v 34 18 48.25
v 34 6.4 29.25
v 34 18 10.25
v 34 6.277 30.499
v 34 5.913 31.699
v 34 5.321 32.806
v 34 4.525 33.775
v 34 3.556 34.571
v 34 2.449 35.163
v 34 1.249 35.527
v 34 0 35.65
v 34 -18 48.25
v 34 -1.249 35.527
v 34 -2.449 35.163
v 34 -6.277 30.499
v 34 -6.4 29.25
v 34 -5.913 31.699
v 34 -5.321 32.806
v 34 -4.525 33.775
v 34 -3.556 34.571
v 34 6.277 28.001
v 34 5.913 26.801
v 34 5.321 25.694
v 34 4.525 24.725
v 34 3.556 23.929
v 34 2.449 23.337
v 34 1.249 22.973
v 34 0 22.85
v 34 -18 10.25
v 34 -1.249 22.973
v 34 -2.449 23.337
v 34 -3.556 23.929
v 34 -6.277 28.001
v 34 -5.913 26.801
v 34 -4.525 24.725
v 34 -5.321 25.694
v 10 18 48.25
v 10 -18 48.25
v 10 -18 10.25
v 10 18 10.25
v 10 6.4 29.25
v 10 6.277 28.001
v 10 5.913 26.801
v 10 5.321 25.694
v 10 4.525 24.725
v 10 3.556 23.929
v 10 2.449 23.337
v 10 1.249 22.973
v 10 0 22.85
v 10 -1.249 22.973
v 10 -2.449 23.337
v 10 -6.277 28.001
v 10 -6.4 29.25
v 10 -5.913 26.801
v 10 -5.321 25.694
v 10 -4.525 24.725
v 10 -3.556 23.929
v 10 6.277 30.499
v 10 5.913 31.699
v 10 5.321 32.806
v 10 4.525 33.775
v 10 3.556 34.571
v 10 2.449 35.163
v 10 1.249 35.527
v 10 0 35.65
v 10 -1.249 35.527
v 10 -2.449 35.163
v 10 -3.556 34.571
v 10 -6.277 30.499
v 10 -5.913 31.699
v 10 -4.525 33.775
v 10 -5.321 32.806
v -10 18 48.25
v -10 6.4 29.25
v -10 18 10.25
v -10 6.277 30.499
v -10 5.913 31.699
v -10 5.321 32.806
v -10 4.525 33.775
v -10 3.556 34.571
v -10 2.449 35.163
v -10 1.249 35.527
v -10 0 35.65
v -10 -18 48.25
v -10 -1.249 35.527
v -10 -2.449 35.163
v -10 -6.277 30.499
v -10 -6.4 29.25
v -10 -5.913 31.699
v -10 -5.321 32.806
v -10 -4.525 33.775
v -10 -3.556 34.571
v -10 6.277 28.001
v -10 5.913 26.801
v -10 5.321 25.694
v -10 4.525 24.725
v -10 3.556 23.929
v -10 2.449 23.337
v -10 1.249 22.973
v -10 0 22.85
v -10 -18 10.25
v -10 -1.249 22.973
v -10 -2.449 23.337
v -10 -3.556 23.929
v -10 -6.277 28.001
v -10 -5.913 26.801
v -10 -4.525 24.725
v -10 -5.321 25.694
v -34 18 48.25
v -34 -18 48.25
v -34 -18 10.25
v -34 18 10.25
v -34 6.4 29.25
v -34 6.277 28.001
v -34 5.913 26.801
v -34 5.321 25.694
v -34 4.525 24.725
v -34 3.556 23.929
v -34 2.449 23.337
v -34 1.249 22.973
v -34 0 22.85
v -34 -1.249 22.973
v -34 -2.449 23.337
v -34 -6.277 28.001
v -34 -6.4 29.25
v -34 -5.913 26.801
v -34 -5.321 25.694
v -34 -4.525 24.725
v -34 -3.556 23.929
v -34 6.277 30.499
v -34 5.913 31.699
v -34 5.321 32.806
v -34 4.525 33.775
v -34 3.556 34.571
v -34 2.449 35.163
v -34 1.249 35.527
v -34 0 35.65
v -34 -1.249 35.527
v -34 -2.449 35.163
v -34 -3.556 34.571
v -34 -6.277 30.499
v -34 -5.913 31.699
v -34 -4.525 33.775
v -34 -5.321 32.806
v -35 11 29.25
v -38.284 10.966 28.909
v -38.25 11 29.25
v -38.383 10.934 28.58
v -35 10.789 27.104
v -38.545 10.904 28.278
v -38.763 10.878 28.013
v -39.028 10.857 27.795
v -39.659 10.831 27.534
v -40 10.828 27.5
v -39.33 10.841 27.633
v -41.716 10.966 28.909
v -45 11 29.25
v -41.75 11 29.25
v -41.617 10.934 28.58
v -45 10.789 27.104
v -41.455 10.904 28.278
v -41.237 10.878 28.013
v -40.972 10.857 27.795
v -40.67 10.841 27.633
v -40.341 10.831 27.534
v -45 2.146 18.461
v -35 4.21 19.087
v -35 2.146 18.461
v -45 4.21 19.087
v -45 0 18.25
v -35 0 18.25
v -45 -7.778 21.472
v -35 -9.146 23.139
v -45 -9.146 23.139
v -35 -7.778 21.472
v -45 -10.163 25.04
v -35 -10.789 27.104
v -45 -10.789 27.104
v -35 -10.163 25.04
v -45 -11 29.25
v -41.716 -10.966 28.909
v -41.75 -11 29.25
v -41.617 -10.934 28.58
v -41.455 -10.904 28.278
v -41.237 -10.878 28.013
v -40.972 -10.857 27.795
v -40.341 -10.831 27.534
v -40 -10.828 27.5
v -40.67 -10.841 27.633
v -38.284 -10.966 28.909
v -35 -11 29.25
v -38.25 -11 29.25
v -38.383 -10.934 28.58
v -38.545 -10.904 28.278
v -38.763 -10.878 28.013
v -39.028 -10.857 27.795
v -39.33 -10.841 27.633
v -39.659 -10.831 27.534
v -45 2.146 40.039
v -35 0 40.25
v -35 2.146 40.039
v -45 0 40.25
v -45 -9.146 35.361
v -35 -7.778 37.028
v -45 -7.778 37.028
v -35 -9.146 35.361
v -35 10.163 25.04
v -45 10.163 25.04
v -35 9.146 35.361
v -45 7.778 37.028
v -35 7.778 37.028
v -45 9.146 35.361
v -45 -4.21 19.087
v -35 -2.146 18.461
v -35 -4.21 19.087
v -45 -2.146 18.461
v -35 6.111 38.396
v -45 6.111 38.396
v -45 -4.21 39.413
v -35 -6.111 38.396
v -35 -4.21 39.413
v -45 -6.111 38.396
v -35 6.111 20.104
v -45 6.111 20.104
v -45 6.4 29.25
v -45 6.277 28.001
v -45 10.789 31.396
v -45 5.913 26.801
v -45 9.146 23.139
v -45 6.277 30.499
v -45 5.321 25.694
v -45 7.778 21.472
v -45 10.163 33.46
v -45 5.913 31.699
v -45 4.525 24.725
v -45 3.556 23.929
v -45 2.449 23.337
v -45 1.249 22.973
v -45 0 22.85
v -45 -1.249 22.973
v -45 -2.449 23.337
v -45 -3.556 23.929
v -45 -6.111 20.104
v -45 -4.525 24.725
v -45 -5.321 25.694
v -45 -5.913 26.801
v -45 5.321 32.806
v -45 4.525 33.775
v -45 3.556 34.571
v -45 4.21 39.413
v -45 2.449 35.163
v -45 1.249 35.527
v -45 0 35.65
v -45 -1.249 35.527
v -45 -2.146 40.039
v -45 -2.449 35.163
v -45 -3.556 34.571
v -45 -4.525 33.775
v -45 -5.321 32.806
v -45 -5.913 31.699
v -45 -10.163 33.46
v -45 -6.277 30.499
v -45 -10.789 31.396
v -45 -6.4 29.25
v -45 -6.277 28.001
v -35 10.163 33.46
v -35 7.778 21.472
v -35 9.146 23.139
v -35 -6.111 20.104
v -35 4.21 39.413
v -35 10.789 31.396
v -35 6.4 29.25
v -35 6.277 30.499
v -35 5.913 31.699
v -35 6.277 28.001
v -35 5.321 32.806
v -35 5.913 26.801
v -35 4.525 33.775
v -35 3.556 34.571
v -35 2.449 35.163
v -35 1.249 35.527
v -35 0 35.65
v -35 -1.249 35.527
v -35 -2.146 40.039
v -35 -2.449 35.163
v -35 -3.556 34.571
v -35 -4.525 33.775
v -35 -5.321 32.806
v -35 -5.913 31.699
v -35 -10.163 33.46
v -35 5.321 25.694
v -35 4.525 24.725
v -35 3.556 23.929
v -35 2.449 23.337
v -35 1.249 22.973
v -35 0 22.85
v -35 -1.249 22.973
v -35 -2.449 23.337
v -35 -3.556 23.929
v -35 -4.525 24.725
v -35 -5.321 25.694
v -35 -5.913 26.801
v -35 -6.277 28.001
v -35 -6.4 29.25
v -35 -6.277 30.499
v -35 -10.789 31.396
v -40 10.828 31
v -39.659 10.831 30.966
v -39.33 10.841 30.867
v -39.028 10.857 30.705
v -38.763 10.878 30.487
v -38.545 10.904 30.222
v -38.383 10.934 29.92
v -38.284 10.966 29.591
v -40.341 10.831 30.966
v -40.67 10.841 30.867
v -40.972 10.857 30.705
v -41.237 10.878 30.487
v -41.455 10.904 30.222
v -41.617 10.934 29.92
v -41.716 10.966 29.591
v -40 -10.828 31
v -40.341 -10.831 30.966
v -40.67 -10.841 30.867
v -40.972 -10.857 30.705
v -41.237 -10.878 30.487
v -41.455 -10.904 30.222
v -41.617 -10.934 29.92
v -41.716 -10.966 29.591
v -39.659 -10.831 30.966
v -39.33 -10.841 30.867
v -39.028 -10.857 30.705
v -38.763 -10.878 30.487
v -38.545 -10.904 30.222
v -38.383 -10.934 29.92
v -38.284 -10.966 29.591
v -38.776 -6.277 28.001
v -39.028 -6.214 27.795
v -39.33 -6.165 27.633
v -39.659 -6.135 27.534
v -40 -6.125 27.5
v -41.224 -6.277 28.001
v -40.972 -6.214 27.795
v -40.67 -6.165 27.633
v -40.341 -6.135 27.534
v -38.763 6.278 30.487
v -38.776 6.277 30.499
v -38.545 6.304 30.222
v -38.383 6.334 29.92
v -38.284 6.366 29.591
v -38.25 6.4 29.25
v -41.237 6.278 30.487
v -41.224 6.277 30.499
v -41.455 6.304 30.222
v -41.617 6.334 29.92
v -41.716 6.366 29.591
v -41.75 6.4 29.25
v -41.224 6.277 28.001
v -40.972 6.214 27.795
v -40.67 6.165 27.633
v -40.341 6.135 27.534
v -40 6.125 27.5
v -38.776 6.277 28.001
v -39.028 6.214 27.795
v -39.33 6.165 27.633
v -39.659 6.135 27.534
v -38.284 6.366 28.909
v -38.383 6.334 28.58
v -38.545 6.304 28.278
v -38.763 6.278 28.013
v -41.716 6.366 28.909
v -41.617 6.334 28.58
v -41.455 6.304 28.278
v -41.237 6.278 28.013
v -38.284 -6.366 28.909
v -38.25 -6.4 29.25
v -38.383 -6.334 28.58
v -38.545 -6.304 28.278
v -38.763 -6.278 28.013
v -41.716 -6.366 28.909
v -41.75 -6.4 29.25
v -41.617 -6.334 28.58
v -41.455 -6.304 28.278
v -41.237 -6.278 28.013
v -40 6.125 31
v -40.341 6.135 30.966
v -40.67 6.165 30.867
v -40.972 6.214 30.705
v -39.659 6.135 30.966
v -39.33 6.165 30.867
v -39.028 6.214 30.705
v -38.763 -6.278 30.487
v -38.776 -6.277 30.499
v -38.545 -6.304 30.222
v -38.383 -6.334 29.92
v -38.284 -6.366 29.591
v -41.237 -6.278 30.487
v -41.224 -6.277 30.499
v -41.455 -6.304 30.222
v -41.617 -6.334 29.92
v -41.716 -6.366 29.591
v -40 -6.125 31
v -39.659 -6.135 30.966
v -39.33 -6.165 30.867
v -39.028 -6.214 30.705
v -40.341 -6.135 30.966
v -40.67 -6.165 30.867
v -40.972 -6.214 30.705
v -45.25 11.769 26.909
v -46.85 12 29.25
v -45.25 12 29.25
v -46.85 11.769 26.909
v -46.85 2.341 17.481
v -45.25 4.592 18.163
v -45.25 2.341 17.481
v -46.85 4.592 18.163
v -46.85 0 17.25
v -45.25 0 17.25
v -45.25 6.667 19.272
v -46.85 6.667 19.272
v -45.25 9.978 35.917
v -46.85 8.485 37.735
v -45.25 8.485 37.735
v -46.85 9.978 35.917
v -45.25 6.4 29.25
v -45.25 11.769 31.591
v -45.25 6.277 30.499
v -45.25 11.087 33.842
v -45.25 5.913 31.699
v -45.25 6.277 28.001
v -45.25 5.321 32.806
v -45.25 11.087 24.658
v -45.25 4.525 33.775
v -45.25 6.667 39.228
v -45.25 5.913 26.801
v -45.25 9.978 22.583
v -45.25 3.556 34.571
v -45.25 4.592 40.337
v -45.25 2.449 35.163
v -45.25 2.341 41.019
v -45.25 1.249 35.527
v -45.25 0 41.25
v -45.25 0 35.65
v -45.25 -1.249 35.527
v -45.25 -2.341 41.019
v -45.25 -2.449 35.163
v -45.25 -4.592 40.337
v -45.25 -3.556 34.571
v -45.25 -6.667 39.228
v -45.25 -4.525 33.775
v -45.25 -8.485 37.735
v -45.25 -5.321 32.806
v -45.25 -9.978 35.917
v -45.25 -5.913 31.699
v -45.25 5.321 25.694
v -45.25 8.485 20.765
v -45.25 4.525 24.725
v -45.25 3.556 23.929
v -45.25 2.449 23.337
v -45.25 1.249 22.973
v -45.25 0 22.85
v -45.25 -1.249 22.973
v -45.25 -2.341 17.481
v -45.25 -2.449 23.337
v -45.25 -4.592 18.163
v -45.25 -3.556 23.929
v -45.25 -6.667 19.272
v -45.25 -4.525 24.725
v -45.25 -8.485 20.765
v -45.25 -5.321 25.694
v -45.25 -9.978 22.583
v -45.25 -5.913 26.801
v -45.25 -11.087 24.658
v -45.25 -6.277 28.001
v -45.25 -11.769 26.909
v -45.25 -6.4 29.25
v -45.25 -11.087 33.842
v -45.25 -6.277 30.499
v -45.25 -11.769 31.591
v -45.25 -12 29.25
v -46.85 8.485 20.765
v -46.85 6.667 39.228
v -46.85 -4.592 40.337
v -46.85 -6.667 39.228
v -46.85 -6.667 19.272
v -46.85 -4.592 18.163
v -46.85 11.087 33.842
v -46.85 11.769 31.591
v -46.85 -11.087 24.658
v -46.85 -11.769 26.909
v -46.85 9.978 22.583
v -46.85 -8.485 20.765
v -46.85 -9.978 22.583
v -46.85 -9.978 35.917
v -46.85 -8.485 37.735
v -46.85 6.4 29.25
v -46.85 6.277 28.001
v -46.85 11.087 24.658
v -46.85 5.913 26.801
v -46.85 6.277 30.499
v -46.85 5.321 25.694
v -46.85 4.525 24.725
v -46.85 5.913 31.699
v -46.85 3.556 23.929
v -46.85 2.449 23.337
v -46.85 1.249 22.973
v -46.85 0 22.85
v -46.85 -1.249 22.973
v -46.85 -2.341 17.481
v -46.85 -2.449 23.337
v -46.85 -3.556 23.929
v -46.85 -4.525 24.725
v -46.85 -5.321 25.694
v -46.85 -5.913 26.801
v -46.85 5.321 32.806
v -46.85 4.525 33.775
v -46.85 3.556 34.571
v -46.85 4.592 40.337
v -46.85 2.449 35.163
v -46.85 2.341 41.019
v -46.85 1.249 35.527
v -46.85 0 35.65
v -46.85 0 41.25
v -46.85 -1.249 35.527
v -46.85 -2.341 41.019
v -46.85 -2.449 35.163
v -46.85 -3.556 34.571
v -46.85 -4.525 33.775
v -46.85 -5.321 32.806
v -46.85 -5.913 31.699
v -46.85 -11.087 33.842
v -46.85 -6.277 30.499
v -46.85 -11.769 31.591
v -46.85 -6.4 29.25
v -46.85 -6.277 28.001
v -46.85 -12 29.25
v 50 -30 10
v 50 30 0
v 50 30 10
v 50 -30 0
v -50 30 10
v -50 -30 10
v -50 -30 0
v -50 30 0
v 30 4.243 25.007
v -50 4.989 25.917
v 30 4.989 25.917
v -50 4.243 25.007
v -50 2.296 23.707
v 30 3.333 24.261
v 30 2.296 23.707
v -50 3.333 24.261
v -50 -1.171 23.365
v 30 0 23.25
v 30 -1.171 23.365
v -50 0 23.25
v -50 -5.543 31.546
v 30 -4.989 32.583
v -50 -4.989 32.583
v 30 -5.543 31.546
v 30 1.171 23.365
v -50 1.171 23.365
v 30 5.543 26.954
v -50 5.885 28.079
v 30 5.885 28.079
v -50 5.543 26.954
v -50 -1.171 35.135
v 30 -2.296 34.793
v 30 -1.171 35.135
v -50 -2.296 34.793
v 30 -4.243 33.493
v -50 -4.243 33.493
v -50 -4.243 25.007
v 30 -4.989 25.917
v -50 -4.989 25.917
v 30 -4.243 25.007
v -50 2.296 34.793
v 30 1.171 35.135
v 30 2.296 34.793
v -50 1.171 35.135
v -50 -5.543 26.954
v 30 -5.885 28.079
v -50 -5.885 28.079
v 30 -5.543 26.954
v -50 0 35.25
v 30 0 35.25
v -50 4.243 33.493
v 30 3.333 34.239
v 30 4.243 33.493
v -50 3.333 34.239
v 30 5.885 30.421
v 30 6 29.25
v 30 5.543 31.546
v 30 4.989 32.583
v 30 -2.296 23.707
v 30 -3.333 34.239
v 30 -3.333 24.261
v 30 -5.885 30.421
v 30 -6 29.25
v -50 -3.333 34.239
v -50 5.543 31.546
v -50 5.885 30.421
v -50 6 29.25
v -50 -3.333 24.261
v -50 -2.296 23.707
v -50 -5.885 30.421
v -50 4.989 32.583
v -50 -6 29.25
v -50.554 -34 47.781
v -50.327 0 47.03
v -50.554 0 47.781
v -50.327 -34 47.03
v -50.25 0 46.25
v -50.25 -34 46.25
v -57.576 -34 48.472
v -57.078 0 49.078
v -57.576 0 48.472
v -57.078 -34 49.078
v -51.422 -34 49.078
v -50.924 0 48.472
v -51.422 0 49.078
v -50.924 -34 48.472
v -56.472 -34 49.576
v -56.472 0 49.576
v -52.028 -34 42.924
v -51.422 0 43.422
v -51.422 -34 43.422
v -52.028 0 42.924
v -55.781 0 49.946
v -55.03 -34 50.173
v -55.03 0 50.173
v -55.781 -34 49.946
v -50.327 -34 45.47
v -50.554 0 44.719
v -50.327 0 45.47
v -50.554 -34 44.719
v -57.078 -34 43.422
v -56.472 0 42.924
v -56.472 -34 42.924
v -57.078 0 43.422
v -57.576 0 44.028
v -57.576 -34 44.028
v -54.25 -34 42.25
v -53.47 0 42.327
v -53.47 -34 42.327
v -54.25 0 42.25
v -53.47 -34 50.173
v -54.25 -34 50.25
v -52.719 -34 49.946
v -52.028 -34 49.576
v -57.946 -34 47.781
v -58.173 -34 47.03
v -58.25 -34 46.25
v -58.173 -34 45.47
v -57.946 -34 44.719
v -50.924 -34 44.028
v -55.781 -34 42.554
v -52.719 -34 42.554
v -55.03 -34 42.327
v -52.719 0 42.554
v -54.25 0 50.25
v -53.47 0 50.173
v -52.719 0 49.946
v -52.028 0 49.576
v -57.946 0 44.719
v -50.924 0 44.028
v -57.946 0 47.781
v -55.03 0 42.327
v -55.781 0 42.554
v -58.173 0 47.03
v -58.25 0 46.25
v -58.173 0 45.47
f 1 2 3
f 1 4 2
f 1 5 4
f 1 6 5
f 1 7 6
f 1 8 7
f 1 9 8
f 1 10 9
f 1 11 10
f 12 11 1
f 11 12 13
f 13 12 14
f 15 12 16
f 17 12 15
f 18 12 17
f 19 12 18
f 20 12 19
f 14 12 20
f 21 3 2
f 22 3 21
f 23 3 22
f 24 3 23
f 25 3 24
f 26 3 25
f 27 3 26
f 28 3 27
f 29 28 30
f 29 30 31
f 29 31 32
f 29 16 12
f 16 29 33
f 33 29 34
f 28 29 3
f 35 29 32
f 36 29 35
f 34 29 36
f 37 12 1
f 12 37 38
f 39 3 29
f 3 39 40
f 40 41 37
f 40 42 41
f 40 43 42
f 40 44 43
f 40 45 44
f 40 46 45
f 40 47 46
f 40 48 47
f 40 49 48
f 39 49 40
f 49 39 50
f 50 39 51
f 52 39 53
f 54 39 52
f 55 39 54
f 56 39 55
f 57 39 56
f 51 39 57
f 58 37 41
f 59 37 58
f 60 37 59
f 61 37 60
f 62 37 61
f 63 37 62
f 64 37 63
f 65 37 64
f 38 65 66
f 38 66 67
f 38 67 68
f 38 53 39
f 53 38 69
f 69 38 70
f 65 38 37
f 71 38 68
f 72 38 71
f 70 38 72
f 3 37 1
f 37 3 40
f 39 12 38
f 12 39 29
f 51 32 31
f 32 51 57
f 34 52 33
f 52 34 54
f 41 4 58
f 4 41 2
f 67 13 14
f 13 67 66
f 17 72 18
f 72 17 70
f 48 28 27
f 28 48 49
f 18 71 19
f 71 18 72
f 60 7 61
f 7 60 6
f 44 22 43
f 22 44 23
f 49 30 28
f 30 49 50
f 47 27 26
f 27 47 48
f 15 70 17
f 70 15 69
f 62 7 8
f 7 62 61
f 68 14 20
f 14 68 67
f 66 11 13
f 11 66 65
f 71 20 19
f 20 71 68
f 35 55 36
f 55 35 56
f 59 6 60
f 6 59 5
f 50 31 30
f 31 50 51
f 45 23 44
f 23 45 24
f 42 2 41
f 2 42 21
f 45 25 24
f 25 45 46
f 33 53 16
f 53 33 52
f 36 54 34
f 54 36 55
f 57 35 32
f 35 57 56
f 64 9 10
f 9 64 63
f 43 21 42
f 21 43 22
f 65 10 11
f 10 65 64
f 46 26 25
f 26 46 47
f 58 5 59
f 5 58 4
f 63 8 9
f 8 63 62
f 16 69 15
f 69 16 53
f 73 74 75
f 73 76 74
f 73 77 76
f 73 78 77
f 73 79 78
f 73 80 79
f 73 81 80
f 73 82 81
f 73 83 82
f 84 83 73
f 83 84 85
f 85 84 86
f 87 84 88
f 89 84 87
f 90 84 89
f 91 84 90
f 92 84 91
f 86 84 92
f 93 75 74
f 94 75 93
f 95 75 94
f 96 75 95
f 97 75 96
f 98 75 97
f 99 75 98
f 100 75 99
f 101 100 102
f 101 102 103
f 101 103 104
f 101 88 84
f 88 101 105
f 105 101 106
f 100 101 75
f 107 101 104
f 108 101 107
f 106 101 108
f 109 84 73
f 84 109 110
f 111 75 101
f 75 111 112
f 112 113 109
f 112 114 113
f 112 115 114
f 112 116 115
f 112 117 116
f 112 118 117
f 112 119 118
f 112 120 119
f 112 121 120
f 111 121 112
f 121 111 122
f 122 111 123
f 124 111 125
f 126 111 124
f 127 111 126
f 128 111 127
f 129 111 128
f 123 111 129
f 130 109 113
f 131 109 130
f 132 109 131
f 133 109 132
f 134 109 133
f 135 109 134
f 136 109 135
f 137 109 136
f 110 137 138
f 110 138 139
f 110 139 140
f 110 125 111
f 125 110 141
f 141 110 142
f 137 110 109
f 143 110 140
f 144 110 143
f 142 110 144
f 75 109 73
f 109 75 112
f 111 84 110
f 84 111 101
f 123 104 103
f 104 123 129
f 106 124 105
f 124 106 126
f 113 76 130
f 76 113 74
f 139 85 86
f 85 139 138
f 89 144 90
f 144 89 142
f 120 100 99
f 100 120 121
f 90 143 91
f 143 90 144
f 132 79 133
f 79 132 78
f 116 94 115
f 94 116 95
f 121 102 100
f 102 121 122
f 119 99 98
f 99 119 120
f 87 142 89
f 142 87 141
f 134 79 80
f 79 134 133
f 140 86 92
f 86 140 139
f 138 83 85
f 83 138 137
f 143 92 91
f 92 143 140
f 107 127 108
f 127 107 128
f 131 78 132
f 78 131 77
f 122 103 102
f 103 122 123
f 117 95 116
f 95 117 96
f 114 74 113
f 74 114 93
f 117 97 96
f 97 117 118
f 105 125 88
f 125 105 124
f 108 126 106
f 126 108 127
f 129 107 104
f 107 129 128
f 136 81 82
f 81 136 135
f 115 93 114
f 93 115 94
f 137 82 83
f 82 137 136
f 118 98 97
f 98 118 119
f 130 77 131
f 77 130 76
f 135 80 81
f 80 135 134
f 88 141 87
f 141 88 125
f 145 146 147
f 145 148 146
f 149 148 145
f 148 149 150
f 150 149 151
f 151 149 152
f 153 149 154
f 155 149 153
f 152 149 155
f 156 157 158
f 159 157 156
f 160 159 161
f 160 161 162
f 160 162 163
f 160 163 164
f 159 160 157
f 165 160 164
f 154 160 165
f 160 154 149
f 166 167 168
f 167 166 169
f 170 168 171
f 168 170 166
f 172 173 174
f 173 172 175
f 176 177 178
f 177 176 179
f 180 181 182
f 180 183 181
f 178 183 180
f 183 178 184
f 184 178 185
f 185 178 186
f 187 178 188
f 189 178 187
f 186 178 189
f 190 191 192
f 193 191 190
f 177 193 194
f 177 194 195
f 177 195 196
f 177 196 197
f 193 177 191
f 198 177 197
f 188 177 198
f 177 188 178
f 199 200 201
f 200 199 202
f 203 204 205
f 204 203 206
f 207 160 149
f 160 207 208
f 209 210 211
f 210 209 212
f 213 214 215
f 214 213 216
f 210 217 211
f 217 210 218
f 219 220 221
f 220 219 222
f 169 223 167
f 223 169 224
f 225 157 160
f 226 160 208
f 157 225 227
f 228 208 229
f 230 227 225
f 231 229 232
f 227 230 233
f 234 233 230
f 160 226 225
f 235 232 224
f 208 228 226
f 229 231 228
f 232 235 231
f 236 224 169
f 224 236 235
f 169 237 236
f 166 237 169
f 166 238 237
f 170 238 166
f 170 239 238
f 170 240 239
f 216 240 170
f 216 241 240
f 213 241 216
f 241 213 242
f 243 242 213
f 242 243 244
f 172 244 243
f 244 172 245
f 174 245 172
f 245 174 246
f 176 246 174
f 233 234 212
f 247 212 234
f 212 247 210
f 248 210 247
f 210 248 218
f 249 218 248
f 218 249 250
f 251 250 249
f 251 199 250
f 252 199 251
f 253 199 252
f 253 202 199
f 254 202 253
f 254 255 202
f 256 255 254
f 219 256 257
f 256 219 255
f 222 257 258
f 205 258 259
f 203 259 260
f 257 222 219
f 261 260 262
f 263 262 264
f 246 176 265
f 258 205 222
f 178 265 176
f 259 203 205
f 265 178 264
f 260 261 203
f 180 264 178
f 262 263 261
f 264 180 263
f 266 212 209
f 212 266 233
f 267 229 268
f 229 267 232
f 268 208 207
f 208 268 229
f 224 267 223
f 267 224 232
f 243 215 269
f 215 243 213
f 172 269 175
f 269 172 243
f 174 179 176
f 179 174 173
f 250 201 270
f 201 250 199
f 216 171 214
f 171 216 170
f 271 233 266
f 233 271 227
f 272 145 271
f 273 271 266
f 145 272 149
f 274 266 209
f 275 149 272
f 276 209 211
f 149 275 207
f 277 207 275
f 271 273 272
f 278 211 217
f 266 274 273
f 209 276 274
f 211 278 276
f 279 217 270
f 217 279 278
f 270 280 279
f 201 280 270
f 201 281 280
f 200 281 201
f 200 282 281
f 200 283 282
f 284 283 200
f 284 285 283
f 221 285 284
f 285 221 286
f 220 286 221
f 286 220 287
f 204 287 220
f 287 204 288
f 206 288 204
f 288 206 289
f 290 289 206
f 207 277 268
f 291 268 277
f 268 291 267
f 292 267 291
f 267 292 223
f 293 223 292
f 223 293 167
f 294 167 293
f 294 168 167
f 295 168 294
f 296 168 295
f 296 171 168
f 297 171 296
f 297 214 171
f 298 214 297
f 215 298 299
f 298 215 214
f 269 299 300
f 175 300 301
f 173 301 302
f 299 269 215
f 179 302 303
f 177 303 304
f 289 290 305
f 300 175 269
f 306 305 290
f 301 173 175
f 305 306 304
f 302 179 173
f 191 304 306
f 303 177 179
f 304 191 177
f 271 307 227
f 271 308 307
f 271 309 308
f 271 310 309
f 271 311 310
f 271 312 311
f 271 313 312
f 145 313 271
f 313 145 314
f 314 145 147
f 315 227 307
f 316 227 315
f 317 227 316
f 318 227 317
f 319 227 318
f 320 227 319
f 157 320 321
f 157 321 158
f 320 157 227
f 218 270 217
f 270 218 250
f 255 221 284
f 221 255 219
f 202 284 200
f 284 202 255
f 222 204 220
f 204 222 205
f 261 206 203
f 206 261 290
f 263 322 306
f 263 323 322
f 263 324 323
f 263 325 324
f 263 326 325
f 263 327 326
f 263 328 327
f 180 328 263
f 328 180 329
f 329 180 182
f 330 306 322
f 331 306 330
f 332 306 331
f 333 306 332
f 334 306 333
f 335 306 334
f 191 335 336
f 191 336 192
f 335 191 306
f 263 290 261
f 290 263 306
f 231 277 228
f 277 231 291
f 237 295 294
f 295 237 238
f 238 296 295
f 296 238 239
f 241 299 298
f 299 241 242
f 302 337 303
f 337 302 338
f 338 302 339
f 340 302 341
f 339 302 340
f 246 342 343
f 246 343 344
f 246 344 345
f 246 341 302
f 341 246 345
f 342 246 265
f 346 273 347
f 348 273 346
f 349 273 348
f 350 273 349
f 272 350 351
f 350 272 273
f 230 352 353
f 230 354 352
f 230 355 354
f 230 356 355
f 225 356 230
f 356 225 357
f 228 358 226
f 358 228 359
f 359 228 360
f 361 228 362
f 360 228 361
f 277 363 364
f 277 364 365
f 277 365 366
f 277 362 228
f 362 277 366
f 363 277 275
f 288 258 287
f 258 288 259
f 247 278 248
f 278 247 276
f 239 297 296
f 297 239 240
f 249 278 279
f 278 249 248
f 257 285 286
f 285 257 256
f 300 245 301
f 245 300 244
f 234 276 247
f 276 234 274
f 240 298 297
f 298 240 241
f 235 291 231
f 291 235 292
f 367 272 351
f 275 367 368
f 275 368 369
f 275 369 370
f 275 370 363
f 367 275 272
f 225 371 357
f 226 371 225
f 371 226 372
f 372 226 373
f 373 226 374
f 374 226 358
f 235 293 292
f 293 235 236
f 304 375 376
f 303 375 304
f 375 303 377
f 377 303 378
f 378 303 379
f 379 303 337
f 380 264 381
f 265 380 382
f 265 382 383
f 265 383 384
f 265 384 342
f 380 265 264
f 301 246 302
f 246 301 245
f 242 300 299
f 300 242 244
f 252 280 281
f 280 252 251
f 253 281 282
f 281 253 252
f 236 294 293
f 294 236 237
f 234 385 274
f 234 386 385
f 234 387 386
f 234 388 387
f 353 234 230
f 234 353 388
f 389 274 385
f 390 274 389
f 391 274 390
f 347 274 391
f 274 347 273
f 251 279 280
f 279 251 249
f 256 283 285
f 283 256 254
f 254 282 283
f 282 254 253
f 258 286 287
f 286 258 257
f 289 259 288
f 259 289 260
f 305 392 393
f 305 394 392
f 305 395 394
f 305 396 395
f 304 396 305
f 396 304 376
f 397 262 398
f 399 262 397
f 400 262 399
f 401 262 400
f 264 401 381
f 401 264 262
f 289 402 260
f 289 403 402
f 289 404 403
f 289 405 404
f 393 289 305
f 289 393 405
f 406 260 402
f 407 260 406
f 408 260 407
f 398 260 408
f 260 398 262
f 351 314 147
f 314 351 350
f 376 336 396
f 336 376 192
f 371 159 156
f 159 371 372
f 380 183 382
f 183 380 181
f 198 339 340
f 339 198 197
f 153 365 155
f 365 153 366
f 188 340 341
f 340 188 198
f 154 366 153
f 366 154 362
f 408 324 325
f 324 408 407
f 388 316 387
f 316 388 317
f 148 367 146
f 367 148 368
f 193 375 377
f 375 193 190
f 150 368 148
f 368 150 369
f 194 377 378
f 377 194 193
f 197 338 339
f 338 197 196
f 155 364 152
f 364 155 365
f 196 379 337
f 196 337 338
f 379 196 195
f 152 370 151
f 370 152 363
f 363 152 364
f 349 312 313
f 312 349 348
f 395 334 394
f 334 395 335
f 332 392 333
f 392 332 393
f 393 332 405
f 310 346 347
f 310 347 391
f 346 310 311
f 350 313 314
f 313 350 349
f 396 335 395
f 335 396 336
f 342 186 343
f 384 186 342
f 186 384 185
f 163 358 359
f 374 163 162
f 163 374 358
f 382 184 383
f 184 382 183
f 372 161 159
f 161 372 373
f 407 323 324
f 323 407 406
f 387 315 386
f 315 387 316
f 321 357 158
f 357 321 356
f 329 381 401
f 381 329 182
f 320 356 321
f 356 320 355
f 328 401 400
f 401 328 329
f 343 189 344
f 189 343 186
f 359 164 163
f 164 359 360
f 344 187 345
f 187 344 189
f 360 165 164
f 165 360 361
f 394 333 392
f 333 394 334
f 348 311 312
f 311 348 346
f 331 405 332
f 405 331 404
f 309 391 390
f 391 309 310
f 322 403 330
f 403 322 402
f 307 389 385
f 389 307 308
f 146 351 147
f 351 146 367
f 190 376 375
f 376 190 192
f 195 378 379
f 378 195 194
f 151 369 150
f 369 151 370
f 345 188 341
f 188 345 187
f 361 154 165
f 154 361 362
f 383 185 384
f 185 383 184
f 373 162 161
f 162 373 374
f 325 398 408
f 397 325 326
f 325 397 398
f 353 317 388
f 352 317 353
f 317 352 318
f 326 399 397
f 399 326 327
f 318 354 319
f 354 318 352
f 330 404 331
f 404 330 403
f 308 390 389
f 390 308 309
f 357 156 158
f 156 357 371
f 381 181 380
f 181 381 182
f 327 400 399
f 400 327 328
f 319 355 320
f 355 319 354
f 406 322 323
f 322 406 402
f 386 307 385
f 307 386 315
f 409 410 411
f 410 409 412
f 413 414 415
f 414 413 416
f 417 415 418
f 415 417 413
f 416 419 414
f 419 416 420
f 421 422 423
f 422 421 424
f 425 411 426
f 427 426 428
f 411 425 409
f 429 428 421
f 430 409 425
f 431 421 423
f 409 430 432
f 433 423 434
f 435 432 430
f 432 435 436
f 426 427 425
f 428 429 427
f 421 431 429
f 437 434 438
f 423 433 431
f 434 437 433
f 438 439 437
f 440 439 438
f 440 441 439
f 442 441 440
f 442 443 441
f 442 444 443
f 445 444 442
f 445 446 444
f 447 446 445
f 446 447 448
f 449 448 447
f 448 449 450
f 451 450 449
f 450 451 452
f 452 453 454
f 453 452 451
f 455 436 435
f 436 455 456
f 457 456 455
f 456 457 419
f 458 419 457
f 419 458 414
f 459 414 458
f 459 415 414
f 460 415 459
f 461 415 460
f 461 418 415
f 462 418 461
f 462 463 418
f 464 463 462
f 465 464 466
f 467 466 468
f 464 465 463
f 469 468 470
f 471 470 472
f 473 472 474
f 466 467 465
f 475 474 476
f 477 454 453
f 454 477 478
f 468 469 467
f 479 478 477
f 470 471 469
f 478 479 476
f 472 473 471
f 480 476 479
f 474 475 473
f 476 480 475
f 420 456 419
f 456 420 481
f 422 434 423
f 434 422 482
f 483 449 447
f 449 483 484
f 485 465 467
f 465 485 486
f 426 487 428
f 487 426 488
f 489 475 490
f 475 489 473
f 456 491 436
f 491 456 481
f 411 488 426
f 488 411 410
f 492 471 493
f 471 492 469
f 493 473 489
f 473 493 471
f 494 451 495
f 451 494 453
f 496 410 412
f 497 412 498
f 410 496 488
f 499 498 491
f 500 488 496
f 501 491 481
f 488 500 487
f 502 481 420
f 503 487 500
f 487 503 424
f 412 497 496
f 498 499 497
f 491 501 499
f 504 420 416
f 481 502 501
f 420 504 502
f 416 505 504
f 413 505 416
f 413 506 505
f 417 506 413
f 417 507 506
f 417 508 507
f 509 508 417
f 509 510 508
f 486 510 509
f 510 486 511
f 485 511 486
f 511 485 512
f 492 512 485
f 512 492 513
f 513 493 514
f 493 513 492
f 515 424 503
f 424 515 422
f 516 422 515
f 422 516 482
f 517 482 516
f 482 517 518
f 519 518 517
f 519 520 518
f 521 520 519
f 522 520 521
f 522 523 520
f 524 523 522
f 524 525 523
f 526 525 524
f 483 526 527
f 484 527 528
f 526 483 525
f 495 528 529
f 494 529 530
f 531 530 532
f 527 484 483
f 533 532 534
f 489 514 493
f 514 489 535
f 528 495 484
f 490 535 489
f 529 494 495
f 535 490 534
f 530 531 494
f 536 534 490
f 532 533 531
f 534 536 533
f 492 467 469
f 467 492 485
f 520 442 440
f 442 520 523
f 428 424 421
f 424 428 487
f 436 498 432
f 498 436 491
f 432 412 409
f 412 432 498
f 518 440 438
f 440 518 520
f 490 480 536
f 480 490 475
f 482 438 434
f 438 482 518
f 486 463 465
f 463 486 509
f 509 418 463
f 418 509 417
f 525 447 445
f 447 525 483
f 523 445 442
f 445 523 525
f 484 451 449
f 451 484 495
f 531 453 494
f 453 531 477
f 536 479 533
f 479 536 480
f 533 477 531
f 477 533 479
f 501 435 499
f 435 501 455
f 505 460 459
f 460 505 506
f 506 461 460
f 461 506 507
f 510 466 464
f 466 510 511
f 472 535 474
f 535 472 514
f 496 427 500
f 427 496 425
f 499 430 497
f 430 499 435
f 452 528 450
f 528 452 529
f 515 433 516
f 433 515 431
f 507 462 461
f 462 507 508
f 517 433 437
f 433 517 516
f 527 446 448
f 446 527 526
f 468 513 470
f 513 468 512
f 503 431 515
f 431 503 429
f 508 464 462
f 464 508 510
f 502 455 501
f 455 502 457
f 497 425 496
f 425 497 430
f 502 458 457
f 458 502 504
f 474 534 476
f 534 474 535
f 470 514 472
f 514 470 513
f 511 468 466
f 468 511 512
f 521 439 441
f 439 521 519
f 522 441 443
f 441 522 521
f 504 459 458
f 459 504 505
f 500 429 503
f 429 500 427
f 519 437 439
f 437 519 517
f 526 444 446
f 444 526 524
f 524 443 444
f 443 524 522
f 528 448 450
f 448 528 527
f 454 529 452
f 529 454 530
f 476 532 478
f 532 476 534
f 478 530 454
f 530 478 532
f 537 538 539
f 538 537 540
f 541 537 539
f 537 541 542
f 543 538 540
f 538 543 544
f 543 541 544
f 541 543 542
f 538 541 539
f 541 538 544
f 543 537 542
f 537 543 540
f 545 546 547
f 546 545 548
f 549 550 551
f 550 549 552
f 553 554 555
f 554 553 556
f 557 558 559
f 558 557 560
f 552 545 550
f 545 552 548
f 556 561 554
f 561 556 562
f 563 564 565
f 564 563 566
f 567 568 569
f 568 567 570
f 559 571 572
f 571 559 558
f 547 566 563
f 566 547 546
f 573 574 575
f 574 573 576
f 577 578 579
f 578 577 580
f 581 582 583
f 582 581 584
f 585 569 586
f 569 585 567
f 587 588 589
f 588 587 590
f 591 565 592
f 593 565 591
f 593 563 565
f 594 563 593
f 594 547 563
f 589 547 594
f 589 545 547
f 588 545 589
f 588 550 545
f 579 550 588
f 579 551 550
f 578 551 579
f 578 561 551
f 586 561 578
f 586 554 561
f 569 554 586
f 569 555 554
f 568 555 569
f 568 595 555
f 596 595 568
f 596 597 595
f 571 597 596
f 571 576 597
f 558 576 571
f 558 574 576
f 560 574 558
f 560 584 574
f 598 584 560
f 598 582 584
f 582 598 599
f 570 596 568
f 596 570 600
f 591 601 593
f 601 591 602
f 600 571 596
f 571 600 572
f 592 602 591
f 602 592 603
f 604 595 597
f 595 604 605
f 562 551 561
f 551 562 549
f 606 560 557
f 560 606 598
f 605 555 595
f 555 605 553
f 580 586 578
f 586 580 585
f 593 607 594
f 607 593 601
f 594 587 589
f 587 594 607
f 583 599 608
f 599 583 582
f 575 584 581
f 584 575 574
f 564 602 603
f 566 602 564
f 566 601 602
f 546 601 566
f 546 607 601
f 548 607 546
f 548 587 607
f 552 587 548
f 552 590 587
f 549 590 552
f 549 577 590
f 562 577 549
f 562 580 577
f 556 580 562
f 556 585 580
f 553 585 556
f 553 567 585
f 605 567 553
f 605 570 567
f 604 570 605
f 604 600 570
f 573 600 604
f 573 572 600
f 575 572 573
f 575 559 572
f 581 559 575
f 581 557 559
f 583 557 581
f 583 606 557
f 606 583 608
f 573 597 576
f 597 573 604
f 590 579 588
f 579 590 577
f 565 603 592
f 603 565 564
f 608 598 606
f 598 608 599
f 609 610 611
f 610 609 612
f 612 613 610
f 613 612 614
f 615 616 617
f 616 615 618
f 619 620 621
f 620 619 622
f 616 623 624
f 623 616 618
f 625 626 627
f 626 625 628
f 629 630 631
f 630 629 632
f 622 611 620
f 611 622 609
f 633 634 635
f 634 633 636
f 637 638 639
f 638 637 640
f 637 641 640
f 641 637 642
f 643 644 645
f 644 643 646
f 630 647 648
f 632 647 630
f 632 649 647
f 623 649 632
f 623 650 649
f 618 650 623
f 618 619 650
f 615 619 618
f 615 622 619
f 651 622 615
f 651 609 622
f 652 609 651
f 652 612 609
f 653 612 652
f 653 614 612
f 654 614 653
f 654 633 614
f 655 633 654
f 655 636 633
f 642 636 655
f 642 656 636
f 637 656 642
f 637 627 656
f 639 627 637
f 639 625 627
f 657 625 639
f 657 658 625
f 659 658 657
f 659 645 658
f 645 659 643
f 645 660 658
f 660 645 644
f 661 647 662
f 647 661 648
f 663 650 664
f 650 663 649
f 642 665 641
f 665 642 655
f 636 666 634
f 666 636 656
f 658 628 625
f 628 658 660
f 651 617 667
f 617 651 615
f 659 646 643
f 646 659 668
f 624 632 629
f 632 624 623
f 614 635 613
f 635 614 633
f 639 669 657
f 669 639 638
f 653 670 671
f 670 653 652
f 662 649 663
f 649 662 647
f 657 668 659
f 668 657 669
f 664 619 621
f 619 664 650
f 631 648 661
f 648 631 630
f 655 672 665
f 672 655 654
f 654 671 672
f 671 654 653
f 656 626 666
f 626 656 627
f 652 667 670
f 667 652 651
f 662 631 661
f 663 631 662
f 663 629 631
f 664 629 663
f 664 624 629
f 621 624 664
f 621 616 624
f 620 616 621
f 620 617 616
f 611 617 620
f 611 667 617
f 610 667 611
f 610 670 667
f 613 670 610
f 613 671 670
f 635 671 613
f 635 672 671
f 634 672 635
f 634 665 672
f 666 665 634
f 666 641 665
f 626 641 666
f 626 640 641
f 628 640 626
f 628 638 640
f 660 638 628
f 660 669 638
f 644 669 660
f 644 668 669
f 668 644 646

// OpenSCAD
$fn = 32;

// ------------------------------------------------------------------------
// Machine vise: screw d12, jaws 24 x 38 mm
// Every part is its own module, assembly() places every instance.
// ------------------------------------------------------------------------

// --- part 1 ---
module vise_bed() {
  difference() {
    translate([-50, -30, 0]) cube([100, 60, 10]);
  }
}

// --- part 2 ---
module vise_jaw() {
  difference() {
    translate([-12, -18, 0]) cube([24, 36, 38]);
    translate([0, 0, 19]) rotate([0, 90, 0]) cylinder(h = 26, d = 12.8, center = true);
  }
}

// --- part 3 ---
module vise_screw() {
  translate([0, 0, -40]) cylinder(h = 80, d = 12);
}

// --- part 4 ---
module screw_collar() {
  difference() {
    cylinder(h = 10, d = 22);
    translate([0, 0, -1]) cylinder(h = 12, d = 12.8);
    translate([0, 0, 5]) rotate([90, 0, 0]) cylinder(h = 24, d = 3.5, center = true);
  }
}

// --- part 5 ---
module screw_washer() {
  difference() {
      translate([0, 0, 0]) cylinder(h = 1.6, d = 24);
      translate([0, 0, -1]) cylinder(h = 3.6, d = 12.8);
    }
}

// --- part 6 ---
module vise_handle() {
  cylinder(h = 34, d = 8);
}

// --- assembly ---
module assembly() {
  color([0.80, 0.24, 0.20]) translate([0, 0, 0]) rotate([0, 0, 0]) vise_bed();
  color([0.20, 0.45, 0.75]) translate([22, 0, 10.25]) rotate([0, 0, 0]) vise_jaw();
  color([0.25, 0.62, 0.32]) translate([-22, 0, 10.25]) rotate([0, 0, 0]) vise_jaw();
  color([0.92, 0.70, 0.18]) translate([-10, 0, 29.25]) rotate([0, 90, 0]) vise_screw();
  color([0.58, 0.35, 0.70]) translate([-45, 0, 29.25]) rotate([0, 90, 0]) screw_collar();
  color([0.16, 0.66, 0.66]) translate([-46.85, 0, 29.25]) rotate([0, 90, 0]) screw_washer();
  color([0.85, 0.48, 0.18]) translate([-54.25, 0, 46.25]) rotate([90, 0, 0]) vise_handle();
}

assembly();
